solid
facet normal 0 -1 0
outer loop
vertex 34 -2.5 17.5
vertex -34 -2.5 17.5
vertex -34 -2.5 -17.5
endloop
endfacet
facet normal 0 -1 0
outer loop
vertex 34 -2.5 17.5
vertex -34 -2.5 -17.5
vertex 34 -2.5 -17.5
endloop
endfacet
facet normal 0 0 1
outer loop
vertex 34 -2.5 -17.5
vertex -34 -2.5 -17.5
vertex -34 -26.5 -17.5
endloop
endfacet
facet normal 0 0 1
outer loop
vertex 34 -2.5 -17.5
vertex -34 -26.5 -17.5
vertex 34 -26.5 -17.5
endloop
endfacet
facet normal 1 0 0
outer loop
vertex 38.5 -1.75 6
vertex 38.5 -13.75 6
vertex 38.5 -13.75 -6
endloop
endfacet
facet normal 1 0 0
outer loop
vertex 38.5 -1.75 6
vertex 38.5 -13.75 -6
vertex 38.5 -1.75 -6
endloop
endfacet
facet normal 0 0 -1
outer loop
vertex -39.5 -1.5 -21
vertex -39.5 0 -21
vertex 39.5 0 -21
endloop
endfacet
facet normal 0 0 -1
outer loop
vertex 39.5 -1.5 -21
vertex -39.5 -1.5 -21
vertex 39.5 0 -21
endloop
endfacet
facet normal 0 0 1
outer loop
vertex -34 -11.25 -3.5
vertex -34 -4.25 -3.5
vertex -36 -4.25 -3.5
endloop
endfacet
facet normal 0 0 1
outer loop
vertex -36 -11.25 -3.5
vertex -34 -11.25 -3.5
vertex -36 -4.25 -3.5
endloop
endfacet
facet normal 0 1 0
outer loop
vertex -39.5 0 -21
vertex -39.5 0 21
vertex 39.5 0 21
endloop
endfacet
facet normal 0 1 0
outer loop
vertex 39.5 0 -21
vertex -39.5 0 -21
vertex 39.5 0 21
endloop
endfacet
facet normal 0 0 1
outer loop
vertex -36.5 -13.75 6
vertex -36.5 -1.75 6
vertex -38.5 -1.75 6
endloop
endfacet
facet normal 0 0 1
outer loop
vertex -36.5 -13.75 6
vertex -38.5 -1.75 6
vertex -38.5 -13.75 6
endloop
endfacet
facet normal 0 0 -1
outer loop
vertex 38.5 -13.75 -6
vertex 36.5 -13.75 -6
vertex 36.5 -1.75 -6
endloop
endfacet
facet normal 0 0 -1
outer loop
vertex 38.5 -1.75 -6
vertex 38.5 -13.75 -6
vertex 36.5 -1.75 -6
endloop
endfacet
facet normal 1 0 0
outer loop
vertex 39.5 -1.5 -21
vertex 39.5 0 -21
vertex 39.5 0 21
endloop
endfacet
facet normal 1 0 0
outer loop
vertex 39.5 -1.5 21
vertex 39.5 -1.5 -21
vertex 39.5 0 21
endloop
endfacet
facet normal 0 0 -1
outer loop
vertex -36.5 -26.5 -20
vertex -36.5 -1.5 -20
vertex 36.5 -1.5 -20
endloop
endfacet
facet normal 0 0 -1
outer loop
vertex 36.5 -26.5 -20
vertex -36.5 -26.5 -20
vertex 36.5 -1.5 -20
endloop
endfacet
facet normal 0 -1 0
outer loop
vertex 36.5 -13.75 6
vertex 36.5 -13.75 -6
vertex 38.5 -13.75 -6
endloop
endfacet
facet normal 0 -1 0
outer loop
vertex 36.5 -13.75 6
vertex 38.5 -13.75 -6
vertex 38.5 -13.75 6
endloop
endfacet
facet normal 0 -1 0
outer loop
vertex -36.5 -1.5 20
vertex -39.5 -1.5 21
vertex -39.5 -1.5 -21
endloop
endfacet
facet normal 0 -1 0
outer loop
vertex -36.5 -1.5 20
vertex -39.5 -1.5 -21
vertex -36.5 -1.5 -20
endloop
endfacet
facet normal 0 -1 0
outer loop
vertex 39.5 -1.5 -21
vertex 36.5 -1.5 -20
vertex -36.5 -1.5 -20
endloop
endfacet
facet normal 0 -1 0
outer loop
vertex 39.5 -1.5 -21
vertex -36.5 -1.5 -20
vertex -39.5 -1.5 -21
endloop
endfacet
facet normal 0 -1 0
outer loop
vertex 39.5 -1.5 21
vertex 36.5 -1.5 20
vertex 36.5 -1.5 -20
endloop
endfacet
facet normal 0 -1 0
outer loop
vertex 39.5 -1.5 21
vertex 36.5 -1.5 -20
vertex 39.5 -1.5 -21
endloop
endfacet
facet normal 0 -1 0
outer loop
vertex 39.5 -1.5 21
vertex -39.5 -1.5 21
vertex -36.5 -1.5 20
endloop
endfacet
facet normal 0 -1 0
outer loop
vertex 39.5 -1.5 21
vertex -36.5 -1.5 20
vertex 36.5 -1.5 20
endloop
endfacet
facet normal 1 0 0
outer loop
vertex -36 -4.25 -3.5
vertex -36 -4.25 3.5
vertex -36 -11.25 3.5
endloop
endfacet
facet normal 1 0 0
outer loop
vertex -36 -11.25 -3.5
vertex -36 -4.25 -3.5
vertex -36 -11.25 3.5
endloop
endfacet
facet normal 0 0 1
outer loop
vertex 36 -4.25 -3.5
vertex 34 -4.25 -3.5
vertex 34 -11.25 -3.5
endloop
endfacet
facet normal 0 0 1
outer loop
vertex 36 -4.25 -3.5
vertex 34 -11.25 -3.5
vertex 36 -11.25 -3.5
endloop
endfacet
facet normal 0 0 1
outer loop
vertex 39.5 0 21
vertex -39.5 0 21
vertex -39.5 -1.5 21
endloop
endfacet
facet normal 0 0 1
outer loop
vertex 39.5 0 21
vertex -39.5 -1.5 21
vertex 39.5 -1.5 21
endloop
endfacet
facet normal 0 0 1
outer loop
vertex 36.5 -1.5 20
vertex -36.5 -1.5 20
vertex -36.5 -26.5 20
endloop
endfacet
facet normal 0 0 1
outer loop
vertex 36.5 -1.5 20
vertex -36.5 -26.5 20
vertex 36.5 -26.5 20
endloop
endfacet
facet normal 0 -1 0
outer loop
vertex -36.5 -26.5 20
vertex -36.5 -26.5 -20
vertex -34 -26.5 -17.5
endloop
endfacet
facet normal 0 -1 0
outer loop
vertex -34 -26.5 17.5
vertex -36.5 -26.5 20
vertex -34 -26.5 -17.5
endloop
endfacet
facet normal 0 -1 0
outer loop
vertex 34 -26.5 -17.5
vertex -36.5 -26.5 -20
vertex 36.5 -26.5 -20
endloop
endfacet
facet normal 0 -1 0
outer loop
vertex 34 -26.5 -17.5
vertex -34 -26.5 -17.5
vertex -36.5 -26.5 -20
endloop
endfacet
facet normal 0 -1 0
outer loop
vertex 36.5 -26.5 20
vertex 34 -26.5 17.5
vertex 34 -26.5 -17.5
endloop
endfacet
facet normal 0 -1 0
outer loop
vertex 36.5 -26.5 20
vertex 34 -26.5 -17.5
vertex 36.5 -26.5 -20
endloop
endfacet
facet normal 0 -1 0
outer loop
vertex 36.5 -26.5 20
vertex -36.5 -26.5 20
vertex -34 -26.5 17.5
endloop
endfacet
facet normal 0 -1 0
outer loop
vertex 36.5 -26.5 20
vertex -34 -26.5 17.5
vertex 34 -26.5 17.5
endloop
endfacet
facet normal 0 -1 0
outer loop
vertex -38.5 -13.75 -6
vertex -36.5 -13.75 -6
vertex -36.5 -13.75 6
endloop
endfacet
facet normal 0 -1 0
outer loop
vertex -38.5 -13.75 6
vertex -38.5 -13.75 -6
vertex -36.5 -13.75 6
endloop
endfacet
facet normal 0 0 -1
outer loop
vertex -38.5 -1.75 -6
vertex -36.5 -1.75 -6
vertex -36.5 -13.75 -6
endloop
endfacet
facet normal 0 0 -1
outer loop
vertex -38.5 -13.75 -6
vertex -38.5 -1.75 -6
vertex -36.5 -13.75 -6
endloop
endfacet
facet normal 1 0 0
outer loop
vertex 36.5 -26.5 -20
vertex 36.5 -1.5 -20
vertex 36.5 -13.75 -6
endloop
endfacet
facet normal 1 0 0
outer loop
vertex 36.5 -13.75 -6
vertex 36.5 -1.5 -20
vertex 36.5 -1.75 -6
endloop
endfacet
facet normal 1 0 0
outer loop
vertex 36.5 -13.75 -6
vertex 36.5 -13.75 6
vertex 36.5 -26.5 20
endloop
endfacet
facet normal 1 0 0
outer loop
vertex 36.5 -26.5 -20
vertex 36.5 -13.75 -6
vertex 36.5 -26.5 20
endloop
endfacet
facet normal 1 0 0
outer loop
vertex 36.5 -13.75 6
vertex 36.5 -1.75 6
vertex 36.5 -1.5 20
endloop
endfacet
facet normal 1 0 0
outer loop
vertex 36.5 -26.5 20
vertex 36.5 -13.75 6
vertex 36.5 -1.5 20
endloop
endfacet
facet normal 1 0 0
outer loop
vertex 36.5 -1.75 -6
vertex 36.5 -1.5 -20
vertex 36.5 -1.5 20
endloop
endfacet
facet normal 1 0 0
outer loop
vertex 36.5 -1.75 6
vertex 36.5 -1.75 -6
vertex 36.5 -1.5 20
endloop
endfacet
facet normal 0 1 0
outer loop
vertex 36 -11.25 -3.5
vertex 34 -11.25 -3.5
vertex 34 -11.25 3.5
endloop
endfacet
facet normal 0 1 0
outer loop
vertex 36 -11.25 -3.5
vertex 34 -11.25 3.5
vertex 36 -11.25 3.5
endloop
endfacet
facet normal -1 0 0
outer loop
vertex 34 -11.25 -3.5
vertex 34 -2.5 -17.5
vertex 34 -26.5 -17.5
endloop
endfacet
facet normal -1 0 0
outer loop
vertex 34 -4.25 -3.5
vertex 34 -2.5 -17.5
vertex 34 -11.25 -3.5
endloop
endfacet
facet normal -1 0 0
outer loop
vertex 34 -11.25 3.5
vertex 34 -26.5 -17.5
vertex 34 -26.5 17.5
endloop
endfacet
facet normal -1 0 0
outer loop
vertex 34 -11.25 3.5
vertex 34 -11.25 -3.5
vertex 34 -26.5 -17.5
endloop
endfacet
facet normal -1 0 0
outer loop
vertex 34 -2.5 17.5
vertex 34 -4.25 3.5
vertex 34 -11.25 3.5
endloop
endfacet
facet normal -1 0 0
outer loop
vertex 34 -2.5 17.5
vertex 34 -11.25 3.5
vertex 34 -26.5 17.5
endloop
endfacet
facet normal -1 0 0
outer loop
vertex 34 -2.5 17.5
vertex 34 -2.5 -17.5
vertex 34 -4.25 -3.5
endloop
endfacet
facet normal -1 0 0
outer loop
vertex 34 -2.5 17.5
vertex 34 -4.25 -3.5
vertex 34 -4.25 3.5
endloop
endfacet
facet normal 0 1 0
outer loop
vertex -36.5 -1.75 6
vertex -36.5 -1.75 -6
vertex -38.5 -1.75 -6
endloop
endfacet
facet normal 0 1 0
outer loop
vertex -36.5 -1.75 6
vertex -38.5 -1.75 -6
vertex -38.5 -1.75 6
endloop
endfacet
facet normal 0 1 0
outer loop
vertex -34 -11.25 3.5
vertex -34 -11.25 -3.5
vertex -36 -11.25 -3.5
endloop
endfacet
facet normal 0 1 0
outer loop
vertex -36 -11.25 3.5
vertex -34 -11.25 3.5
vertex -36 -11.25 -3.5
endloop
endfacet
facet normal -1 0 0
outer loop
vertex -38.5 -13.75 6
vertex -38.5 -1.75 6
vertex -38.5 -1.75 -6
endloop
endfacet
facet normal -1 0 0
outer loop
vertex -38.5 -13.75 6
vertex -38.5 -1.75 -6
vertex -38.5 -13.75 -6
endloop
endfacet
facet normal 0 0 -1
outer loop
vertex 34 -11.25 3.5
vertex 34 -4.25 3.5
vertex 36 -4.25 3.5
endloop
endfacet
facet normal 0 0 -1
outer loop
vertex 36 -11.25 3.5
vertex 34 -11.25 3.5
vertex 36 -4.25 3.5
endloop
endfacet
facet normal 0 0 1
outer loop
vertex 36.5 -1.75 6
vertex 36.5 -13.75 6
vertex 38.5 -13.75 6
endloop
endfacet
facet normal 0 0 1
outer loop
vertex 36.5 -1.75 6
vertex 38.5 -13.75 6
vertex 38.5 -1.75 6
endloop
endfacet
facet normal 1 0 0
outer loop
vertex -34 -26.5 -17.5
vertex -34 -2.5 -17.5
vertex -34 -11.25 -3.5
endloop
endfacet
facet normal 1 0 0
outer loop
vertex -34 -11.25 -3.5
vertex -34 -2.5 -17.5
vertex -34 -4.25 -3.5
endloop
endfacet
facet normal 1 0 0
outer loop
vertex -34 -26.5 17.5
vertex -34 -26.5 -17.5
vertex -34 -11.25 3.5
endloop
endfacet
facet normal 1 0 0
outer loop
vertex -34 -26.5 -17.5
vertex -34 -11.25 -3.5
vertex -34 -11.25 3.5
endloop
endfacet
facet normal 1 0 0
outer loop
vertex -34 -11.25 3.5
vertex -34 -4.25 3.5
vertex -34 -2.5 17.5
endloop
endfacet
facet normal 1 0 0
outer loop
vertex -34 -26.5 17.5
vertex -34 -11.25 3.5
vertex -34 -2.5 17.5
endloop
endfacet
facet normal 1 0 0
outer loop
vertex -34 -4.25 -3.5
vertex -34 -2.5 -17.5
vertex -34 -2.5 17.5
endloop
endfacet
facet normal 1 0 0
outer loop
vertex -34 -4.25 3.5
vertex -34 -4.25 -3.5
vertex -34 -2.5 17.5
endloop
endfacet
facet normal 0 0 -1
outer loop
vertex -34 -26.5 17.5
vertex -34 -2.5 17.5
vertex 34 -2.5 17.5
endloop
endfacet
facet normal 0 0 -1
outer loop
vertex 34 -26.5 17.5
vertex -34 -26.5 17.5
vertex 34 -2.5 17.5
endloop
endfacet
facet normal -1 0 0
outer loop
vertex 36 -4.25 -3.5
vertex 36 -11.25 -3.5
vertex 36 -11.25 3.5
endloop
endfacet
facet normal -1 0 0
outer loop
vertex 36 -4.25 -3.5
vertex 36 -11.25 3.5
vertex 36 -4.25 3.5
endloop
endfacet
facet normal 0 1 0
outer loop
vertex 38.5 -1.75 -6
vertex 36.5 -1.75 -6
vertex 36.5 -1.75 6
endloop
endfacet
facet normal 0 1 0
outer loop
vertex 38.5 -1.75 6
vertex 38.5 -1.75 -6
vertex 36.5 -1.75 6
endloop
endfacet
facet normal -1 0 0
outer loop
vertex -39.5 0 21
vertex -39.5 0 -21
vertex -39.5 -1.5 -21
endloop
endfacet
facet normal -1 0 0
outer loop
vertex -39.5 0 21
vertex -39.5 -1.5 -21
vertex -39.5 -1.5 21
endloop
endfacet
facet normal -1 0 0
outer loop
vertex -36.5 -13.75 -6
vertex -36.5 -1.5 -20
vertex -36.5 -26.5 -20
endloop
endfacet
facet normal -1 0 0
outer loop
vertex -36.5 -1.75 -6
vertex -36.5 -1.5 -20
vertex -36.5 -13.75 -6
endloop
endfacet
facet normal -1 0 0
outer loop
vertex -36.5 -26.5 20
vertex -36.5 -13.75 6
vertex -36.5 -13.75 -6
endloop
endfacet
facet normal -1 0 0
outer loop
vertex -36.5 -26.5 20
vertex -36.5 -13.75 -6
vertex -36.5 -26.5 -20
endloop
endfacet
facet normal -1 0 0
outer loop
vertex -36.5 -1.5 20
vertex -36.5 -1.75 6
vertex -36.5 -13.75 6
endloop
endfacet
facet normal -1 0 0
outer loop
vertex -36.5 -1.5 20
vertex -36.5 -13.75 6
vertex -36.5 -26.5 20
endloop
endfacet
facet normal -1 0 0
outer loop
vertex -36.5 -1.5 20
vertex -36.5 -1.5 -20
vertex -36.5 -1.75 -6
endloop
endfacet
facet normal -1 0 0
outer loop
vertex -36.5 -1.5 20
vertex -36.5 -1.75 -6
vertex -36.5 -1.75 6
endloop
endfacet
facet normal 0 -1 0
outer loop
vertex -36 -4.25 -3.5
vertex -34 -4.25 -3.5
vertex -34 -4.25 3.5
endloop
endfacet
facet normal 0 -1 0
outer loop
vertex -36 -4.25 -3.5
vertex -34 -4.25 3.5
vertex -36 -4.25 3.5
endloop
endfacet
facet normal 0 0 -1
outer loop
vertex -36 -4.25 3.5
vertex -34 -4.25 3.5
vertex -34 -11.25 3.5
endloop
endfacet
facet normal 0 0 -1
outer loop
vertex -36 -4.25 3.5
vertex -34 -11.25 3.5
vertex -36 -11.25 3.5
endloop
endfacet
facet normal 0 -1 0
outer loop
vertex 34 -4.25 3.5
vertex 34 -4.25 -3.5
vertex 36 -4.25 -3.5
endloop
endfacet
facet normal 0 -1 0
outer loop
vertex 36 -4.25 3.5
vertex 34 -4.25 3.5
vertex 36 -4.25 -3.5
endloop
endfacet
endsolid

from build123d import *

# Parameters (mm, degrees)
F0_W        = 73
F0_H        = 40
F1_DEPTH    = 26.5
F0_W_2      = 79
F0_H_2      = 42
F2_DEPTH    = 1.5
F3_W        = 12
F3_H        = 12
F4_DEPTH    = 2
F5_W        = 12
F5_H        = 12
F6_DEPTH    = 2
F7_T        = 2.5
F7_T3_DEPTH = 78
F7_T5_DEPTH = 45
F7_T7_DEPTH = 17
F7_T9_DEPTH = 17


# Not quite as in the source:
# - a shell that OpenCascade refuses in one call is made with other operations: the cavity is built on its own and cut out


with BuildPart() as f1:
    # F0 (on Front) → F1 (new body)
    with BuildSketch(Plane.XZ):
        Rectangle(F0_W, F0_H)
    extrude(amount=F1_DEPTH)

    # F0 (on Front) → F2 (join)
    with BuildSketch(Plane.XZ):
        Rectangle(F0_W_2, F0_H_2)
        Rectangle(F0_W, F0_H, mode=Mode.SUBTRACT)
    extrude(amount=F2_DEPTH)

    # F3 (on face) → F4 (join)
    with BuildSketch(Plane(origin=(-36.5, 0, 0), x_dir=(0, -1, 0), z_dir=(-1, 0, 0))):
        with Locations((7.75, 0)):
            Rectangle(F3_W, F3_H)
    extrude(amount=F4_DEPTH)

    # F5 (on face) → F6 (join)
    with BuildSketch(Plane.YZ.offset(36.5)):
        with Locations((-7.75, 0)):
            Rectangle(F5_W, F5_H)
    extrude(amount=F6_DEPTH)

    # F7: shell of thickness 2.5, made by hand


with BuildPart() as f7_core1:
    # F7_t2: copy of F1
    add(f1.part)

    # the walls: a layer under each face that stays
    f7_faces = [f7_core1.faces().sort_by_distance(p)[0] for p in [
        (0, -14, -20),
        (-36.8666666667, -1.5, -19.6),
        (36.5, -14, 0),
        (-36.5, -14, 0),
        (0, -0.75, -21),
        (39.5, -0.75, 0),
        (0, -0.75, 21),
        (-39.5, -0.75, 0),
        (0, -14, 20),
        (37.5, -13.75, 0),
        (37.5, -7.75, 6),
        (37.5, -1.75, 0),
        (37.5, -7.75, -6),
        (-37.5, -1.75, 0),
        (-37.5, -7.75, 6),
        (-37.5, -13.75, 0),
        (-37.5, -7.75, -6),
        (0, 0, 0),
        (38.5, -7.75, 0),
        (-38.5, -7.75, 0),
    ]]
    thicken(f7_faces, amount=-F7_T, mode=Mode.SUBTRACT)

    # F7_s4 → F7_t3 (cut)
    with BuildSketch(Plane.YZ.offset(-39)):
        Polygon((-1.525, -20.025), (-1.5, -17.5), (1, -17.5), (1, -20), align=None)
        Polygon((-1.525, 20.025), (1, 20), (1, 17.5), (-1.5, 17.5), align=None)
    extrude(amount=F7_T3_DEPTH, mode=Mode.SUBTRACT)

    # F7_s6 → F7_t5 (cut)
    with BuildSketch(Plane.XY.offset(-22.5)):
        Polygon((36.525, -1.525), (36.5, 1), (34, 1), (34, -1.5), align=None)
        Polygon((-36.525, -1.525), (-36.5, 1), (-34, 1), (-34, -1.5), align=None)
    extrude(amount=F7_T5_DEPTH, mode=Mode.SUBTRACT)

    # F7_s8 → F7_t7 (cut)
    with BuildSketch(Plane.XY.offset(-8.5)):
        Polygon((36.525, -13.775), (34, -13.75), (34, -11.25), (36.5, -11.25), align=None)
        Polygon((36.525, -1.725), (34, -1.75), (34, -4.25), (36.5, -4.25), align=None)
        Polygon((-36.525, -1.725), (-34, -1.75), (-34, -4.25), (-36.5, -4.25), align=None)
        Polygon((-36.525, -13.775), (-34, -13.75), (-34, -11.25), (-36.5, -11.25), align=None)
    extrude(amount=F7_T7_DEPTH, mode=Mode.SUBTRACT)

    # F7_s10 → F7_t9 (cut)
    with BuildSketch(Plane.XZ.offset(-0.75)):
        Polygon((36.525, 6.025), (34, 6), (34, 3.5), (36.5, 3.5), align=None)
        Polygon((36.525, -6.025), (34, -6), (34, -3.5), (36.5, -3.5), align=None)
        Polygon((-36.525, 6.025), (-34, 6), (-34, 3.5), (-36.5, 3.5), align=None)
        Polygon((-36.525, -6.025), (-34, -6), (-34, -3.5), (-36.5, -3.5), align=None)
    extrude(amount=F7_T9_DEPTH, mode=Mode.SUBTRACT)


with BuildPart() as f1_1:
    add(f1.part)

    # what is left inside the walls is the cavity
    f7_cavity = [f7_core1.part.solids().sort_by_distance(p)[0] for p in [
        (0, -2.525, -5.833333),
    ]]
    add(f7_cavity, mode=Mode.SUBTRACT)


solid = f1_1.part
